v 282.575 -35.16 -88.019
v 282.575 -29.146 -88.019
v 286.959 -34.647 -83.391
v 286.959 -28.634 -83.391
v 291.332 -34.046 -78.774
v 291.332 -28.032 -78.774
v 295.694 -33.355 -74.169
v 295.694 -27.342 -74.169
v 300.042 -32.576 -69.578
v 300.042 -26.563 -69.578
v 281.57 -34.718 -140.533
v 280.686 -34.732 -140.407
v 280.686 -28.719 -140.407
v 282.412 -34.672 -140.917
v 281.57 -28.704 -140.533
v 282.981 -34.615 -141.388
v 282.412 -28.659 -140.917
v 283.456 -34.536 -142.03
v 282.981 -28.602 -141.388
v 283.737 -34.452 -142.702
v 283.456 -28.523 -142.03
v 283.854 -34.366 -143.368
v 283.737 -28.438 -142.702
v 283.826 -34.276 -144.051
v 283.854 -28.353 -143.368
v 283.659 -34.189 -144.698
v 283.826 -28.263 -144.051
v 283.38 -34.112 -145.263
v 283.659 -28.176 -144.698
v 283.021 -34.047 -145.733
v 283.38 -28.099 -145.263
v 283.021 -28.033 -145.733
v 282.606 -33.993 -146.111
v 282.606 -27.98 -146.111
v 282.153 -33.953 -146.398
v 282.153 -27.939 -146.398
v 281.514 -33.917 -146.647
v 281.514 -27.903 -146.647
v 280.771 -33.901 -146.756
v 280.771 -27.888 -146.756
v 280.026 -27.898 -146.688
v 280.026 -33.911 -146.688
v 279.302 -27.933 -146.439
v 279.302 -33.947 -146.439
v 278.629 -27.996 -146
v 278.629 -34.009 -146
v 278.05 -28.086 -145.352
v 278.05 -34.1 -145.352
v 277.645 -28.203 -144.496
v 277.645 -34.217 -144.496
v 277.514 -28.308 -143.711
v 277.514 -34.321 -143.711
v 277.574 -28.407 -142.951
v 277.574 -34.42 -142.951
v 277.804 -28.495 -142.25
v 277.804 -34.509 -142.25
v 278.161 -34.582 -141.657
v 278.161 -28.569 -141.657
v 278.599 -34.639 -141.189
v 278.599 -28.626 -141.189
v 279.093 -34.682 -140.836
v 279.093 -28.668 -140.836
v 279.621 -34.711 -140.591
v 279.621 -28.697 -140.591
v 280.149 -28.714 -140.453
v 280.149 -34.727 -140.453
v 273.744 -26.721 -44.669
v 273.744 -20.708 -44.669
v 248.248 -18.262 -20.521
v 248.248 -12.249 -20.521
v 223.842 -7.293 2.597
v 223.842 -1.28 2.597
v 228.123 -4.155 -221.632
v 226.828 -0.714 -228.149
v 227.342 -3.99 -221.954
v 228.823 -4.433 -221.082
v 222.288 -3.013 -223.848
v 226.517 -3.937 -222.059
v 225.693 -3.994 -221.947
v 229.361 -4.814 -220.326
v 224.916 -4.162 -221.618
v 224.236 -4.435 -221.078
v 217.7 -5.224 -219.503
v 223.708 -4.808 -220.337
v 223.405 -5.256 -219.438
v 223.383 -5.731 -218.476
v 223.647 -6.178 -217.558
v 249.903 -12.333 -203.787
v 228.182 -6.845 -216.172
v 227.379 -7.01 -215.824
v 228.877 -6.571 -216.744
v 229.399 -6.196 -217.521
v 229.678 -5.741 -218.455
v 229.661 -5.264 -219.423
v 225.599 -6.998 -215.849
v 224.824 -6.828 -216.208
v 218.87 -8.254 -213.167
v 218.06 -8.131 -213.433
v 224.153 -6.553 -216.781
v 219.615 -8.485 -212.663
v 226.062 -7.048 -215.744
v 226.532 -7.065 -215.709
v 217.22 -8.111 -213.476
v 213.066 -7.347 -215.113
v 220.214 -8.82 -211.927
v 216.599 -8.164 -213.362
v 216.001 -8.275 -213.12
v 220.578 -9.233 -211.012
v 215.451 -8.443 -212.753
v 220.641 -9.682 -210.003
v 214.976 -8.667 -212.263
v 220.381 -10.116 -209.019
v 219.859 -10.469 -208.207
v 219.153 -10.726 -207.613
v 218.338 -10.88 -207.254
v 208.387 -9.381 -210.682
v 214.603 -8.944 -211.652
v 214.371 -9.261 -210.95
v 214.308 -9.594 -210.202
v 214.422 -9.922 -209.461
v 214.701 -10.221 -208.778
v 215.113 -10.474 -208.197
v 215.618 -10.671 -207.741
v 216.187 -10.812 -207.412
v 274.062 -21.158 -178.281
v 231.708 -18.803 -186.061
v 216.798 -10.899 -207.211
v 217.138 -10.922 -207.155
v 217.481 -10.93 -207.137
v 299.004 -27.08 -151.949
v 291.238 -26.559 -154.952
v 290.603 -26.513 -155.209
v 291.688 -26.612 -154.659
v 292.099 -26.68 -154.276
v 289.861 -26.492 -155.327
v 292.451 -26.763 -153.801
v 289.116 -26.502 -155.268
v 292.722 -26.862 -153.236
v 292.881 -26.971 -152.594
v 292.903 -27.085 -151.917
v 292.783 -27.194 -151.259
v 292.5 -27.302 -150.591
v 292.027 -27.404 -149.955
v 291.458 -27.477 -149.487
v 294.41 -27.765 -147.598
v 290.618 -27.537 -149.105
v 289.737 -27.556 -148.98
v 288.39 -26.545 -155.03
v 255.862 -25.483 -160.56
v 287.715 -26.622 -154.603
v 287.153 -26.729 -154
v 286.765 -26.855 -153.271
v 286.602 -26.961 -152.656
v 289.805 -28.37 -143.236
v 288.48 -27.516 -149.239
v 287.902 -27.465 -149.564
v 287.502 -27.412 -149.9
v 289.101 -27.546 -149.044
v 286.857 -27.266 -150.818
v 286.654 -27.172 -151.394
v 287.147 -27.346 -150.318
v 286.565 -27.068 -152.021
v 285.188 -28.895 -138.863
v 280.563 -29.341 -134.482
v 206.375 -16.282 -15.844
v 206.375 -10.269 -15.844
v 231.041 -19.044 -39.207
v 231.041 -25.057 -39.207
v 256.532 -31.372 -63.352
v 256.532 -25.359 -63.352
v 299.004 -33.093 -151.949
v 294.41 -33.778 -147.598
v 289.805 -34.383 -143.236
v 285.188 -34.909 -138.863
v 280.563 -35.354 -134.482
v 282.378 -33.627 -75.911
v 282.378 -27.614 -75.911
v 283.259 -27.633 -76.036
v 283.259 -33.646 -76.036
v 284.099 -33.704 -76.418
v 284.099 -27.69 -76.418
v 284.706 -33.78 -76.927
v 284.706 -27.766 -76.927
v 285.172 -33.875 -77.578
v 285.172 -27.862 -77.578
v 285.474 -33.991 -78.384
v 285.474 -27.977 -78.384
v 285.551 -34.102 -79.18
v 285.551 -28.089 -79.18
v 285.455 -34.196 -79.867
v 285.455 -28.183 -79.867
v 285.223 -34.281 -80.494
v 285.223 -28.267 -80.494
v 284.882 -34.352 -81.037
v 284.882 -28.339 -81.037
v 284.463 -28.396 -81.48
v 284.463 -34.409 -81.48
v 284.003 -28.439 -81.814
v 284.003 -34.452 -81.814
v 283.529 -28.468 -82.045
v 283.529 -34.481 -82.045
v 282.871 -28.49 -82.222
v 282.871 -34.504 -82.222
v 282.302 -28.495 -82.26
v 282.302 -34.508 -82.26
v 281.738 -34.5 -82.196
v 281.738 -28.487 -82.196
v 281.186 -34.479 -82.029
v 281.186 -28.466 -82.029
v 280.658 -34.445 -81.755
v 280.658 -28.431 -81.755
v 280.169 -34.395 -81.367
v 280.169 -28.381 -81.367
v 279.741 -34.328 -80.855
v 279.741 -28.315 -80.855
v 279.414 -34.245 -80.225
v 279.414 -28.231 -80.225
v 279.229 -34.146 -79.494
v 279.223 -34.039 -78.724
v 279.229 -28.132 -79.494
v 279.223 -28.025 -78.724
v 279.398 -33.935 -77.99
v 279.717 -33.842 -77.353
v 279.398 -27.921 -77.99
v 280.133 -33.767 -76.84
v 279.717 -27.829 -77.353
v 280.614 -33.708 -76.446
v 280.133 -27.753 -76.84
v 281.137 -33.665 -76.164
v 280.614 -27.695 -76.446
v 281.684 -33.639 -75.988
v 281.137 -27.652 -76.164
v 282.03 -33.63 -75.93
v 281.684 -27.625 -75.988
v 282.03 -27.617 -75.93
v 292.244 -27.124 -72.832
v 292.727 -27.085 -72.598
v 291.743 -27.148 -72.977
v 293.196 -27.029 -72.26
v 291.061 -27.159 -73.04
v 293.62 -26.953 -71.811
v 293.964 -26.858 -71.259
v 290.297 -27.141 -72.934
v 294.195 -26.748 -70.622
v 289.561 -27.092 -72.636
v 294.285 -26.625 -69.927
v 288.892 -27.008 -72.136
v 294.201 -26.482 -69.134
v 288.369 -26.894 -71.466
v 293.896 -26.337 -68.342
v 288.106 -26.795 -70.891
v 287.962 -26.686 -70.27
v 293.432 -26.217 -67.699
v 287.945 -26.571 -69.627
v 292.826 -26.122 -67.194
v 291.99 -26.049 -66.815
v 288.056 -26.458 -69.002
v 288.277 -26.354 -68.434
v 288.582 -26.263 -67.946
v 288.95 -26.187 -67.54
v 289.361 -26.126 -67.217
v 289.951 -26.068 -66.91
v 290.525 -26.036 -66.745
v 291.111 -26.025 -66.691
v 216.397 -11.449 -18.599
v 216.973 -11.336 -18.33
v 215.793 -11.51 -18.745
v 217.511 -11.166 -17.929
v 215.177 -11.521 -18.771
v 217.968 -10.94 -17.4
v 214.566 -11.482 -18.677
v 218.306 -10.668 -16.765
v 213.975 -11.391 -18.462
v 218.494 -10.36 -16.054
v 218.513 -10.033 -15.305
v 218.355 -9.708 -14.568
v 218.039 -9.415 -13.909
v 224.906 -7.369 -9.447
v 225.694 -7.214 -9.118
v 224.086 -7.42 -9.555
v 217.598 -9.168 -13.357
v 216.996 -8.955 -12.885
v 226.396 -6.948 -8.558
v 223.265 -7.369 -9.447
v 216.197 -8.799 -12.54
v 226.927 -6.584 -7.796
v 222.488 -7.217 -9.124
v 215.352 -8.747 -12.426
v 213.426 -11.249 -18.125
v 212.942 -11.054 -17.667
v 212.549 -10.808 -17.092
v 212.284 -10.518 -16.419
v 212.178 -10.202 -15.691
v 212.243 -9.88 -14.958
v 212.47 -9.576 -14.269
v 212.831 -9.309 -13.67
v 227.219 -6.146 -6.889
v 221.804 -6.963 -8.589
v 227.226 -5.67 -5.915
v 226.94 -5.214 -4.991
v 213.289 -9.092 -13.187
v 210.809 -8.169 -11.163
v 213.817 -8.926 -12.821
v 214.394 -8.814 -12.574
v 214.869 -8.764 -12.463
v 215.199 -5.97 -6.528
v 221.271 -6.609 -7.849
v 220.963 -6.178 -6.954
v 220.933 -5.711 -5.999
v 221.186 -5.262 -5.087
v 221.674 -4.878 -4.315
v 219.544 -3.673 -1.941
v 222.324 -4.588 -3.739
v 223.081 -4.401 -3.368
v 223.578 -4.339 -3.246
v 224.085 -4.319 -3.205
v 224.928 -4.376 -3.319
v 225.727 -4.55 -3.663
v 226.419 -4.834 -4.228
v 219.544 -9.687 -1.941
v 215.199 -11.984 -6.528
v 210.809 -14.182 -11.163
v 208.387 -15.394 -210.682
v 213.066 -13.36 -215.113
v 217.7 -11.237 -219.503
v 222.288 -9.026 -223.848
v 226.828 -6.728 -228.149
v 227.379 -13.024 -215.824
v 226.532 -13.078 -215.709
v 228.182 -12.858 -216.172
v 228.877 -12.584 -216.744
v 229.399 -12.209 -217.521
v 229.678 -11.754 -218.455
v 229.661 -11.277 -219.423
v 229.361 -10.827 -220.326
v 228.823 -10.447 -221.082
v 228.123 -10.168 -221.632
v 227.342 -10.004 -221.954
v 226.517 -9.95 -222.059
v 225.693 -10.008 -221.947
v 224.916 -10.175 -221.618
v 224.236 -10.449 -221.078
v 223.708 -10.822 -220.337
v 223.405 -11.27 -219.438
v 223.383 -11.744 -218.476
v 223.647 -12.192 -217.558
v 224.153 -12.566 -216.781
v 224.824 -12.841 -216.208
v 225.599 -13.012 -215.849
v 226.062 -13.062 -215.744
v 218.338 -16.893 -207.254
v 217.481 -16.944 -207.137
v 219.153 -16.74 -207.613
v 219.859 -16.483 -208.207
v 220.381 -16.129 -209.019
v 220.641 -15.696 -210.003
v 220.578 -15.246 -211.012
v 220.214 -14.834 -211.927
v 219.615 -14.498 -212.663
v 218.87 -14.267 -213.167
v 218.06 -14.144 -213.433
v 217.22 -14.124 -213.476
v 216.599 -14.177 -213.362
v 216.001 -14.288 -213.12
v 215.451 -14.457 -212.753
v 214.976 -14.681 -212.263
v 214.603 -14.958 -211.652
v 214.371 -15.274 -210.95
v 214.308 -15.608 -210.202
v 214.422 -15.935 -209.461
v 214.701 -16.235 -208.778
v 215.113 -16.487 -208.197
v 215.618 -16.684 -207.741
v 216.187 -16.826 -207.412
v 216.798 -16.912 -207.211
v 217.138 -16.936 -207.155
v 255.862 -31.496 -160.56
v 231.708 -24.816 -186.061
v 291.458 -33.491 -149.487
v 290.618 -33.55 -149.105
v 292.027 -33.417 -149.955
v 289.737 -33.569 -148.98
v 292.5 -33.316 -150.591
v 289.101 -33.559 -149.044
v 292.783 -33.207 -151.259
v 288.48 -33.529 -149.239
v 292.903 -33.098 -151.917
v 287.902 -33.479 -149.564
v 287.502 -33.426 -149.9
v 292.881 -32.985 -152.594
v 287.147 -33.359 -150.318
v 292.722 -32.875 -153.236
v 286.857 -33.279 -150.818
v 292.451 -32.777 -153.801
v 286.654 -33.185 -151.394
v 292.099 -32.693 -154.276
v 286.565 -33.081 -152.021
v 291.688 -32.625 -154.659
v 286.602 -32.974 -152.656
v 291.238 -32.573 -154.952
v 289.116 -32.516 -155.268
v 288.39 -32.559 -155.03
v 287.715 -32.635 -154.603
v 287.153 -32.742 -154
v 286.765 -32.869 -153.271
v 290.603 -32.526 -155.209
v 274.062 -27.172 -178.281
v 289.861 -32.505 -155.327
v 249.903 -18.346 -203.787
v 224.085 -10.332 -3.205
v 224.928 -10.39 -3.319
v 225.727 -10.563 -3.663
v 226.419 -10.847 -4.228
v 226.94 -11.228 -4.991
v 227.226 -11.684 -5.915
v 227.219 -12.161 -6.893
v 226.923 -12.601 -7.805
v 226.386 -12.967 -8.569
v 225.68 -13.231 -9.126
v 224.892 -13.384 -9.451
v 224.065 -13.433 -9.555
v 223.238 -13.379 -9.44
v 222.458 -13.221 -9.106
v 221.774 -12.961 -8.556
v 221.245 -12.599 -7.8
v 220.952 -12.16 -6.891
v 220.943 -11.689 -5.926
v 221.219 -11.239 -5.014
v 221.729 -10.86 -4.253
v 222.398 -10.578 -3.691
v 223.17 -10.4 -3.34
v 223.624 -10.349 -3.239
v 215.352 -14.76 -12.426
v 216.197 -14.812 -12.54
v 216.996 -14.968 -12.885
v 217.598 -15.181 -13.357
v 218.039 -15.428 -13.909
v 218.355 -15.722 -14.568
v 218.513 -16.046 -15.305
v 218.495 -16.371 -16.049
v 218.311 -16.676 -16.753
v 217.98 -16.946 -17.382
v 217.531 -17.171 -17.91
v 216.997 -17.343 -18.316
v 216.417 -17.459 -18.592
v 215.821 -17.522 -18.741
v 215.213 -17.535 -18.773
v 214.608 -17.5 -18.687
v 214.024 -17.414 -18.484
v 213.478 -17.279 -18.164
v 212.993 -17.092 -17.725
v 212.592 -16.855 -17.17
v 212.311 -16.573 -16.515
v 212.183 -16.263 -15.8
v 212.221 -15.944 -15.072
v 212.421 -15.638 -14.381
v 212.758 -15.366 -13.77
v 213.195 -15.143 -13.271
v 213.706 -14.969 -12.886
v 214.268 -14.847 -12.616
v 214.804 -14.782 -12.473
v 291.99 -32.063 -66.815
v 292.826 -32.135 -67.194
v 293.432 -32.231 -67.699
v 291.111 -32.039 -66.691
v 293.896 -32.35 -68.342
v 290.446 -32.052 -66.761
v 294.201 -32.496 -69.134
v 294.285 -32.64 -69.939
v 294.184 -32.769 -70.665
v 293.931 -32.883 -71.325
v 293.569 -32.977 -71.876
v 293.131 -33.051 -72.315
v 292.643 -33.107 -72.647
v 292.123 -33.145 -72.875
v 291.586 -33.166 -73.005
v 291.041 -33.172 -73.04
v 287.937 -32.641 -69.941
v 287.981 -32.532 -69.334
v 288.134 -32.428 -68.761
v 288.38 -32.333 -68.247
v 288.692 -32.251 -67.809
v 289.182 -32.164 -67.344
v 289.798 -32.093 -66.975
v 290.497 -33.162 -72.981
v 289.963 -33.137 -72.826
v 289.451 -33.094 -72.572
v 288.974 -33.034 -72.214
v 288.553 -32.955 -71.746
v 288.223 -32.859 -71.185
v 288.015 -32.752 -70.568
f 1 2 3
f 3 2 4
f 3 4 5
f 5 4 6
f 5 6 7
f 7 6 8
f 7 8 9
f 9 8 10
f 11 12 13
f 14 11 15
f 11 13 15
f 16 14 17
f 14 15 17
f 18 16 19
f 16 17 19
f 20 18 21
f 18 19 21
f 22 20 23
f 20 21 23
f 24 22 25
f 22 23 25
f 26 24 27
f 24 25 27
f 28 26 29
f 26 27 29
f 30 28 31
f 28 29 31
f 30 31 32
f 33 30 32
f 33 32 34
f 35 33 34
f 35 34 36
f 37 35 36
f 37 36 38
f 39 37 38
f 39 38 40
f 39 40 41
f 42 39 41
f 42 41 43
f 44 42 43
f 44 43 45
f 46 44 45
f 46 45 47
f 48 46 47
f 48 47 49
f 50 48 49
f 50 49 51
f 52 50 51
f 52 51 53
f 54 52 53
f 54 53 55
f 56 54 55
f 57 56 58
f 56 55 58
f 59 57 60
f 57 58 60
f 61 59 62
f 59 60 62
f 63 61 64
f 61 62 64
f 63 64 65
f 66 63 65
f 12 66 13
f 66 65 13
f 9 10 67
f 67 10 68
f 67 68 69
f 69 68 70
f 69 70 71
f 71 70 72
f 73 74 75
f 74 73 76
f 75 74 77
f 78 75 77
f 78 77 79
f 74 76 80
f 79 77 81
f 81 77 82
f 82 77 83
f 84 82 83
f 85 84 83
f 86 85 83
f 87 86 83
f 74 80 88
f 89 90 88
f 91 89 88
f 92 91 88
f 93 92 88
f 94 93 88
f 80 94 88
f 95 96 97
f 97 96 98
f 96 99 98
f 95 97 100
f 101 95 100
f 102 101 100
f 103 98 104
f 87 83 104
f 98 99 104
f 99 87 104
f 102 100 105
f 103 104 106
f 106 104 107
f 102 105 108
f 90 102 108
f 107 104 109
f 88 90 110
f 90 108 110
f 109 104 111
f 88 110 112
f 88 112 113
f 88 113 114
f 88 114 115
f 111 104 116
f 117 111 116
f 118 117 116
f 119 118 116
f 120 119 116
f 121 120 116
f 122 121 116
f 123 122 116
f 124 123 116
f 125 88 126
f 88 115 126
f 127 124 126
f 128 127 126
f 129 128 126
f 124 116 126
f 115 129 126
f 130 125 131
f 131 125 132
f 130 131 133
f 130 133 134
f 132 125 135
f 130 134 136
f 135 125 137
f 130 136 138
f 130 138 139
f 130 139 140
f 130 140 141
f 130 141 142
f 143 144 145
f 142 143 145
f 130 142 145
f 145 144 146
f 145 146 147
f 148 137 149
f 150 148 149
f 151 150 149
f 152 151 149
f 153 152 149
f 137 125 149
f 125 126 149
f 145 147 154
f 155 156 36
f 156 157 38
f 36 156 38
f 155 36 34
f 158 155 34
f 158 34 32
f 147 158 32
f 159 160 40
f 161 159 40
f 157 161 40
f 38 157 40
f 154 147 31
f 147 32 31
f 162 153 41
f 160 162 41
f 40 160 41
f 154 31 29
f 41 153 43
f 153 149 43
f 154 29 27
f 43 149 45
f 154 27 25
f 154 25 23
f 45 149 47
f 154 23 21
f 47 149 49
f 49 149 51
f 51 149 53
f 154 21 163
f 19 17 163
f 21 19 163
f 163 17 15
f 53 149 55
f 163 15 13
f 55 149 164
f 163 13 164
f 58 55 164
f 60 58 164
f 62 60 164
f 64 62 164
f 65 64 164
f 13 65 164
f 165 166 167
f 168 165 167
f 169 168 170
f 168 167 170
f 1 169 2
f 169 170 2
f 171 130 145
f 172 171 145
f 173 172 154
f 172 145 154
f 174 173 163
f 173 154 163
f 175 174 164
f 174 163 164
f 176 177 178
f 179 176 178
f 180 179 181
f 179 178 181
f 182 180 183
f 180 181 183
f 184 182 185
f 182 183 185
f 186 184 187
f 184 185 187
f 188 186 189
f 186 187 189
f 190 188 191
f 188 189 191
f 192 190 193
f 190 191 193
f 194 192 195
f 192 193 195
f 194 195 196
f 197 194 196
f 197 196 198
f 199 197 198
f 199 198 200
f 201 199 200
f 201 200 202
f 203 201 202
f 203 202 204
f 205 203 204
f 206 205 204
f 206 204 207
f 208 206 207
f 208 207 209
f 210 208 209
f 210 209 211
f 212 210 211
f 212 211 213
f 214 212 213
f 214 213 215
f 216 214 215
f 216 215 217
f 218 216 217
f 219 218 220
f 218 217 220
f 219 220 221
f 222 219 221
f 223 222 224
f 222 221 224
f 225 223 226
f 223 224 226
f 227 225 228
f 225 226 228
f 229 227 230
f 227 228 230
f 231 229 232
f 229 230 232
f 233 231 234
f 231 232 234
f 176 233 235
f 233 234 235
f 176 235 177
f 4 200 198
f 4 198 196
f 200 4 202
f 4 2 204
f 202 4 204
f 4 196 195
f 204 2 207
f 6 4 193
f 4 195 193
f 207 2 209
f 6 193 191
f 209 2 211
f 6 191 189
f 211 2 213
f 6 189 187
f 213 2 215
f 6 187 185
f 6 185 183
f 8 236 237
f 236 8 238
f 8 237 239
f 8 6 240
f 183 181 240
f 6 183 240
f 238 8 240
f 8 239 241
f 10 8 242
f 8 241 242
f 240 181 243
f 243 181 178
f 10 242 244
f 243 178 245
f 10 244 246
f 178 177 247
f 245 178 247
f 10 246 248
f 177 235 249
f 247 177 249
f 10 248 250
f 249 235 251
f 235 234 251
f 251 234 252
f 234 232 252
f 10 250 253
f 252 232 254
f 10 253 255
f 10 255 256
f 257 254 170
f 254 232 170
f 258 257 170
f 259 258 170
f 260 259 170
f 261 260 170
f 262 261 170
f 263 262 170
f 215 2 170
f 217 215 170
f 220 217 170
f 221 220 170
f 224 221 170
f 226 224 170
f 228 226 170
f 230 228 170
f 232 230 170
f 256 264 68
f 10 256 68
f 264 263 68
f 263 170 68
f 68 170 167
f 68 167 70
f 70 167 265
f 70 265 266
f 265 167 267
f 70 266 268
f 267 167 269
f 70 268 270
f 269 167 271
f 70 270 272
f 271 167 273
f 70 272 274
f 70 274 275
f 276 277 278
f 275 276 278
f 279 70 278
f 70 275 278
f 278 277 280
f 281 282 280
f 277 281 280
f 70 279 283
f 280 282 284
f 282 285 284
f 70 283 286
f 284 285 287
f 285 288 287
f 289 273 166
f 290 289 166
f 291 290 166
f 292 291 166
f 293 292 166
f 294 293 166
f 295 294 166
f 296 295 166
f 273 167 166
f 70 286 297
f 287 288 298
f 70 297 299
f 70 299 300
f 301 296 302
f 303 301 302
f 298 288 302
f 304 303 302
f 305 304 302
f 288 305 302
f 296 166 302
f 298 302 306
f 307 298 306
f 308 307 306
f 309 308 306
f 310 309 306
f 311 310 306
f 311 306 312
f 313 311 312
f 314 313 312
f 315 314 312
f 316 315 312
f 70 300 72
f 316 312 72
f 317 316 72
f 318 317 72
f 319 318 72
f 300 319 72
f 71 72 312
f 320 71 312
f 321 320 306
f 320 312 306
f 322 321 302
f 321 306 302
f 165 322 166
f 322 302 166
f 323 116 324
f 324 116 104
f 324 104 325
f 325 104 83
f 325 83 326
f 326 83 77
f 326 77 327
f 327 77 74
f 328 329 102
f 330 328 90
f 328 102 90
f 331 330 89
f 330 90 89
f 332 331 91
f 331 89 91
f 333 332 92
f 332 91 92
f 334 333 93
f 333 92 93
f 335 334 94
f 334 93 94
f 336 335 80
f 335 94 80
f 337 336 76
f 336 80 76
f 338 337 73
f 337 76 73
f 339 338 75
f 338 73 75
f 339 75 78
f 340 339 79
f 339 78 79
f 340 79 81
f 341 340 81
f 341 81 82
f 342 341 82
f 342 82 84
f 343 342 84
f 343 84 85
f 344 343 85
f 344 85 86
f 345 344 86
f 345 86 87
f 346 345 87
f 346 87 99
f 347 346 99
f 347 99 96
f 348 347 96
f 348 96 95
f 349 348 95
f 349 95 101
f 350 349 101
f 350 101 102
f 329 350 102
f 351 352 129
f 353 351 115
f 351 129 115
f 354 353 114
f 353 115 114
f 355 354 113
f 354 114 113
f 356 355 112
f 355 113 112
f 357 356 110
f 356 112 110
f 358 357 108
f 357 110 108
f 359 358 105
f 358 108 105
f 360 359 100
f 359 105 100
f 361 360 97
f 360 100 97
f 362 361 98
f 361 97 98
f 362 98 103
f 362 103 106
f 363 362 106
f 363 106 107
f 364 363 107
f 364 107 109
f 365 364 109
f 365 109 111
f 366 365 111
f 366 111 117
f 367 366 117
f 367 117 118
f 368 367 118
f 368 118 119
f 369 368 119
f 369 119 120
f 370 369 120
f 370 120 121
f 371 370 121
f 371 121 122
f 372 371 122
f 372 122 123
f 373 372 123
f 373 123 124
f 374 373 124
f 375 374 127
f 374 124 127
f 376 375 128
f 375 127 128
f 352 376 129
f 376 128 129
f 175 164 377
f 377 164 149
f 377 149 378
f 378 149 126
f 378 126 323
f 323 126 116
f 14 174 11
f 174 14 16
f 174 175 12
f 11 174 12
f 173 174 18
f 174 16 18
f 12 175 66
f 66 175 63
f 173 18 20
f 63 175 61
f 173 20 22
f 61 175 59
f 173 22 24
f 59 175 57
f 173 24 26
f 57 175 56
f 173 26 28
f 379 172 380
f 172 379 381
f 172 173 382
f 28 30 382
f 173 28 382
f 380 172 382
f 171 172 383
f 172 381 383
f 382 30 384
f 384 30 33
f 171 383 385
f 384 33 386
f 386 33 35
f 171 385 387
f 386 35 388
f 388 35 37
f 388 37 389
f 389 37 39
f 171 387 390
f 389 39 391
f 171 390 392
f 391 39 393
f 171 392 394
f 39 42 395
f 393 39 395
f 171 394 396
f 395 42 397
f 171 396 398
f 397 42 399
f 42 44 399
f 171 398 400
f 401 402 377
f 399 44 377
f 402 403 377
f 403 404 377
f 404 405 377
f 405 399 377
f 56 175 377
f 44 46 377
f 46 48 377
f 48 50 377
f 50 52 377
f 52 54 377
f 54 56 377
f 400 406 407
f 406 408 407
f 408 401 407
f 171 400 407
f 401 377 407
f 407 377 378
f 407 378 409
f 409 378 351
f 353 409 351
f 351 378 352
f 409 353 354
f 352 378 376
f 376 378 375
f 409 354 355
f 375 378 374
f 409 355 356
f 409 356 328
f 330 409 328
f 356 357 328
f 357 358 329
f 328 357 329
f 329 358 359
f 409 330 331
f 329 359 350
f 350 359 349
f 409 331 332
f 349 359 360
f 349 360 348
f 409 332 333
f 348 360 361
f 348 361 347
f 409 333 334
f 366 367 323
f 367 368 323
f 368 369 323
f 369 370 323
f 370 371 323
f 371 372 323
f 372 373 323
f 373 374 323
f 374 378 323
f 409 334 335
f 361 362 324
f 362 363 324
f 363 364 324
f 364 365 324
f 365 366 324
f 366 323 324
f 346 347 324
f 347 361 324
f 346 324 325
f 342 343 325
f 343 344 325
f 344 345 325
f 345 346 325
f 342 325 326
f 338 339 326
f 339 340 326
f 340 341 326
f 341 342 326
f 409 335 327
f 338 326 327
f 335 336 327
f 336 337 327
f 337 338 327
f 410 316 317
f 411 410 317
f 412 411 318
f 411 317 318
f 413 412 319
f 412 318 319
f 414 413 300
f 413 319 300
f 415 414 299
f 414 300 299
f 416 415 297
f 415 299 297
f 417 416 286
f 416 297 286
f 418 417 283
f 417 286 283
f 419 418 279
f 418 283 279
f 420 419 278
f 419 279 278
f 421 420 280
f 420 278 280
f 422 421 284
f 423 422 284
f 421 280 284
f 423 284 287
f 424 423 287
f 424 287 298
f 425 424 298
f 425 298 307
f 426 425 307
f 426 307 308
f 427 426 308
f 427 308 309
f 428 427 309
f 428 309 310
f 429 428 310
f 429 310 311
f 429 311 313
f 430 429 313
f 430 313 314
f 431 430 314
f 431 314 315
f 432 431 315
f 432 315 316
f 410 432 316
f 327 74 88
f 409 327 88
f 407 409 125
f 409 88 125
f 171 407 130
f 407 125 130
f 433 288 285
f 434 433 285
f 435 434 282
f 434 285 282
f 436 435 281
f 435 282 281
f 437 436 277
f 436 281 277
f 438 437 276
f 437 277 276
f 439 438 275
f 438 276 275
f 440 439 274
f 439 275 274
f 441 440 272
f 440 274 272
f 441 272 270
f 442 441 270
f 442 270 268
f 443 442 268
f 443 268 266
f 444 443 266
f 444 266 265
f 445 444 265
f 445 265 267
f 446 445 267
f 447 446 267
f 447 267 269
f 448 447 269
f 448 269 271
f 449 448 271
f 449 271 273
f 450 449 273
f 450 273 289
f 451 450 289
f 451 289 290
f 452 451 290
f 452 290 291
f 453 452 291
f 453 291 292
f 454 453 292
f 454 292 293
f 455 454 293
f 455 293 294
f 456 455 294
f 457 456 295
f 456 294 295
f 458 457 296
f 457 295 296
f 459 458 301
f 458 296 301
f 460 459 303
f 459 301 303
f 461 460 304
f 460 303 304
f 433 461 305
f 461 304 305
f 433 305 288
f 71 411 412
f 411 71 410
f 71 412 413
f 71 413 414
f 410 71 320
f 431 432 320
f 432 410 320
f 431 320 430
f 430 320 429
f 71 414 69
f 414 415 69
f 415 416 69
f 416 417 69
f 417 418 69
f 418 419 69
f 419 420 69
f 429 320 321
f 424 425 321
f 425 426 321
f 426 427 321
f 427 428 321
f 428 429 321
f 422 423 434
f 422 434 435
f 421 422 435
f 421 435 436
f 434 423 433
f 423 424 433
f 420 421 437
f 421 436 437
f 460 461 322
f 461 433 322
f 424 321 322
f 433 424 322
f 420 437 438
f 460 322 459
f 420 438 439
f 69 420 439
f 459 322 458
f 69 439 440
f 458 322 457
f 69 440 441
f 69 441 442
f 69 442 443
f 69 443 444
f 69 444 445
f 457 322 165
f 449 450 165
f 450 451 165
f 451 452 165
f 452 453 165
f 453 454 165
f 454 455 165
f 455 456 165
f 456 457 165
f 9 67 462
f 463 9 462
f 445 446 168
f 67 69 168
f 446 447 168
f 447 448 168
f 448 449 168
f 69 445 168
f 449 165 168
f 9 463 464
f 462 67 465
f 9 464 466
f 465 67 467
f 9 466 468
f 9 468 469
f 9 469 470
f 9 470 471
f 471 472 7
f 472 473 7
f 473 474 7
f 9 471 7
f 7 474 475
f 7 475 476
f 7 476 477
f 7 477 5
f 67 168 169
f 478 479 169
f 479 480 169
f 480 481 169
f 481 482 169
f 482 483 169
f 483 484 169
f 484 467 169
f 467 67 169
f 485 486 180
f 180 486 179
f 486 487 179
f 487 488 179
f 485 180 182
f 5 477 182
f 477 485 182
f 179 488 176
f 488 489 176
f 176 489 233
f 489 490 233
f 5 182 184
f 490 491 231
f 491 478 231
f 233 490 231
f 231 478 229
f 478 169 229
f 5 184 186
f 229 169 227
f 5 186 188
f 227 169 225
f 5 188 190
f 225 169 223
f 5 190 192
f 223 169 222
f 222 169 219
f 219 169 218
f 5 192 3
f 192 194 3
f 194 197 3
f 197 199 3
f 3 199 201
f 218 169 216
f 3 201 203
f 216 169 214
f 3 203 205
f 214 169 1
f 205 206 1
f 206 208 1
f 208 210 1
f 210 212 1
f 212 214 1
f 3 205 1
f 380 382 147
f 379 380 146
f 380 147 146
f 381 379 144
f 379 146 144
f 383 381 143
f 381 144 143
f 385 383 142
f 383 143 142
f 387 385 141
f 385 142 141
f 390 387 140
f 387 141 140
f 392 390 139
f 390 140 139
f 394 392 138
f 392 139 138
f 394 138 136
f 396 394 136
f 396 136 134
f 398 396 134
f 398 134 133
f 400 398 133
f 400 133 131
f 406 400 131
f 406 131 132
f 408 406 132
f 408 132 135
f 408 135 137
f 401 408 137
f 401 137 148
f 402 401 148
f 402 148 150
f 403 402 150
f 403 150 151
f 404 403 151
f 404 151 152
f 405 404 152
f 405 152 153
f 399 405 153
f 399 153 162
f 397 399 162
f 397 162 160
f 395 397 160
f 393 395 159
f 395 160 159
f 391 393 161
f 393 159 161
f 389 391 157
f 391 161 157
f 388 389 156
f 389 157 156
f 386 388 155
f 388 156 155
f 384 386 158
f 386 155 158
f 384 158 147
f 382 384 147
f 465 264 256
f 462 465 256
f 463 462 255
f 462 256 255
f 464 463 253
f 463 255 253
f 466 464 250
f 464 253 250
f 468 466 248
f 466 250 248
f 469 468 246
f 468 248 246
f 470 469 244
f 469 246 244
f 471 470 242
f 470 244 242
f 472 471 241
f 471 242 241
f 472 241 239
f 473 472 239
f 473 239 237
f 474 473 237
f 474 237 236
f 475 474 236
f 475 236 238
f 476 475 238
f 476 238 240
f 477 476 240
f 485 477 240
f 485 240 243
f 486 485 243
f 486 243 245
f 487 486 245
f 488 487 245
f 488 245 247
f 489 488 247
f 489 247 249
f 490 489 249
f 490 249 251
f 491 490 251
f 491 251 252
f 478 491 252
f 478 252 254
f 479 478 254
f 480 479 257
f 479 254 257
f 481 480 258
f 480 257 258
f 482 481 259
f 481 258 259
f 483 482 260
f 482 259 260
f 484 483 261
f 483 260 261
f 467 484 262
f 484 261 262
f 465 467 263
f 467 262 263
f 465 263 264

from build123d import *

# Parameters (mm, degrees)
BOSS_EXTRUDE4_DEPTH = 304.8
SKETCH5_OUTSIDE_W   = 384.928
SKETCH5_OUTSIDE_H   = 321.428
CUT_EXTRUDE1_DEPTH  = 304.8
SKETCH6_R           = 3.175
CUT_EXTRUDE2_DEPTH  = 304.8


with BuildPart() as part:
    # Sketch3 → Boss-Extrude4 (new body)
    with BuildSketch(Plane(origin=(0, 0, 0), x_dir=(0, 0, -1), z_dir=(1, 0, 0))):
        with BuildLine():
            ThreePointArc((232.90669496, 1.961354585), (112.25669496, -30.366715482), (-8.39330504, 1.961354585))
            Line((-8.39330504, 1.961354585), (-8.39330504, -4.052041589))
            ThreePointArc((-8.39330504, -4.052041589), (112.25669496, -36.380111656), (232.90669496, -4.052041589))
            Line((232.90669496, -4.052041589), (232.90669496, 1.961354585))
        make_face()
    extrude(amount=BOSS_EXTRUDE4_DEPTH)

    # Sketch5 outside → Cut-Extrude1 (cut)
    with BuildSketch(Plane(origin=(0, 1.961354585, 0), x_dir=(1, 0, 0), z_dir=(0, 1, 0))):
        with Locations((152.4, 112.257)):
            Rectangle(SKETCH5_OUTSIDE_W, SKETCH5_OUTSIDE_H)
        Polygon((226.828288051, 228.148595599), (299.003543902, 151.948595599), (280.562627926, 134.48169496), (208.387372074, 210.68169496), align=None, mode=Mode.SUBTRACT)
        Polygon((282.575, 88.019322885), (300.04190064, 69.578406909), (223.84190064, -2.596848943), (206.375, 15.844067034), align=None, mode=Mode.SUBTRACT)
    extrude(amount=-CUT_EXTRUDE1_DEPTH, mode=Mode.SUBTRACT)


with BuildPart() as cut_extrude1_piece_1:
    # of the separate pieces the step leaves, piece 1, a body of its own (cut_extrude1_pieces)
    add(part.part.solids().sort_by_distance((206.375, -10.268648513, -15.844067034))[0])


with BuildPart() as cut_extrude1_piece_2:
    # of the separate pieces the step leaves, piece 2, a body of its own (cut_extrude1_pieces)
    add(part.part.solids().sort_by_distance((208.387372074, -9.380603776, -210.68169496))[0])


with BuildPart() as cut_extrude2_tool:
    # Sketch6 → Cut-Extrude2 (new body)
    with BuildSketch(Plane(origin=(0, 1.961354585, 0), x_dir=(1, 0, 0), z_dir=(0, 1, 0))):
        with Locations(Location((224.085404474, 6.380105211, 0), (0, 0, 270))):
            Circle(SKETCH6_R)
        with Locations(Location((215.351954154, 15.6005632, 0), (0, 0, 270))):
            Circle(SKETCH6_R)
        with Locations(Location((282.377616466, 79.086053042, 0), (0, 0, 270))):
            Circle(SKETCH6_R)
        with Locations(Location((291.111066785, 69.865595053, 0), (0, 0, 270))):
            Circle(SKETCH6_R)
        with Locations(Location((280.686030826, 143.582052014, 0), (0, 0, 270))):
            Circle(SKETCH6_R)
        with Locations(Location((289.736735323, 152.15471491, 0), (0, 0, 270))):
            Circle(SKETCH6_R)
        with Locations(Location((226.531741371, 218.884239902, 0), (0, 0, 270))):
            Circle(SKETCH6_R)
        with Locations(Location((217.481036874, 210.311577006, 0), (0, 0, 270))):
            Circle(SKETCH6_R)
    extrude(amount=-CUT_EXTRUDE2_DEPTH)


with BuildPart() as cut_extrude1_piece_1_1:
    add(cut_extrude1_piece_1.part)

    # Cut-Extrude2: cut by cut_extrude2_tool
    add(cut_extrude2_tool.part, mode=Mode.SUBTRACT)


with BuildPart() as cut_extrude1_piece_2_1:
    add(cut_extrude1_piece_2.part)

    # Cut-Extrude2: cut by cut_extrude2_tool
    add(cut_extrude2_tool.part, mode=Mode.SUBTRACT)


solid = Compound([cut_extrude1_piece_1_1.part, cut_extrude1_piece_2_1.part])
